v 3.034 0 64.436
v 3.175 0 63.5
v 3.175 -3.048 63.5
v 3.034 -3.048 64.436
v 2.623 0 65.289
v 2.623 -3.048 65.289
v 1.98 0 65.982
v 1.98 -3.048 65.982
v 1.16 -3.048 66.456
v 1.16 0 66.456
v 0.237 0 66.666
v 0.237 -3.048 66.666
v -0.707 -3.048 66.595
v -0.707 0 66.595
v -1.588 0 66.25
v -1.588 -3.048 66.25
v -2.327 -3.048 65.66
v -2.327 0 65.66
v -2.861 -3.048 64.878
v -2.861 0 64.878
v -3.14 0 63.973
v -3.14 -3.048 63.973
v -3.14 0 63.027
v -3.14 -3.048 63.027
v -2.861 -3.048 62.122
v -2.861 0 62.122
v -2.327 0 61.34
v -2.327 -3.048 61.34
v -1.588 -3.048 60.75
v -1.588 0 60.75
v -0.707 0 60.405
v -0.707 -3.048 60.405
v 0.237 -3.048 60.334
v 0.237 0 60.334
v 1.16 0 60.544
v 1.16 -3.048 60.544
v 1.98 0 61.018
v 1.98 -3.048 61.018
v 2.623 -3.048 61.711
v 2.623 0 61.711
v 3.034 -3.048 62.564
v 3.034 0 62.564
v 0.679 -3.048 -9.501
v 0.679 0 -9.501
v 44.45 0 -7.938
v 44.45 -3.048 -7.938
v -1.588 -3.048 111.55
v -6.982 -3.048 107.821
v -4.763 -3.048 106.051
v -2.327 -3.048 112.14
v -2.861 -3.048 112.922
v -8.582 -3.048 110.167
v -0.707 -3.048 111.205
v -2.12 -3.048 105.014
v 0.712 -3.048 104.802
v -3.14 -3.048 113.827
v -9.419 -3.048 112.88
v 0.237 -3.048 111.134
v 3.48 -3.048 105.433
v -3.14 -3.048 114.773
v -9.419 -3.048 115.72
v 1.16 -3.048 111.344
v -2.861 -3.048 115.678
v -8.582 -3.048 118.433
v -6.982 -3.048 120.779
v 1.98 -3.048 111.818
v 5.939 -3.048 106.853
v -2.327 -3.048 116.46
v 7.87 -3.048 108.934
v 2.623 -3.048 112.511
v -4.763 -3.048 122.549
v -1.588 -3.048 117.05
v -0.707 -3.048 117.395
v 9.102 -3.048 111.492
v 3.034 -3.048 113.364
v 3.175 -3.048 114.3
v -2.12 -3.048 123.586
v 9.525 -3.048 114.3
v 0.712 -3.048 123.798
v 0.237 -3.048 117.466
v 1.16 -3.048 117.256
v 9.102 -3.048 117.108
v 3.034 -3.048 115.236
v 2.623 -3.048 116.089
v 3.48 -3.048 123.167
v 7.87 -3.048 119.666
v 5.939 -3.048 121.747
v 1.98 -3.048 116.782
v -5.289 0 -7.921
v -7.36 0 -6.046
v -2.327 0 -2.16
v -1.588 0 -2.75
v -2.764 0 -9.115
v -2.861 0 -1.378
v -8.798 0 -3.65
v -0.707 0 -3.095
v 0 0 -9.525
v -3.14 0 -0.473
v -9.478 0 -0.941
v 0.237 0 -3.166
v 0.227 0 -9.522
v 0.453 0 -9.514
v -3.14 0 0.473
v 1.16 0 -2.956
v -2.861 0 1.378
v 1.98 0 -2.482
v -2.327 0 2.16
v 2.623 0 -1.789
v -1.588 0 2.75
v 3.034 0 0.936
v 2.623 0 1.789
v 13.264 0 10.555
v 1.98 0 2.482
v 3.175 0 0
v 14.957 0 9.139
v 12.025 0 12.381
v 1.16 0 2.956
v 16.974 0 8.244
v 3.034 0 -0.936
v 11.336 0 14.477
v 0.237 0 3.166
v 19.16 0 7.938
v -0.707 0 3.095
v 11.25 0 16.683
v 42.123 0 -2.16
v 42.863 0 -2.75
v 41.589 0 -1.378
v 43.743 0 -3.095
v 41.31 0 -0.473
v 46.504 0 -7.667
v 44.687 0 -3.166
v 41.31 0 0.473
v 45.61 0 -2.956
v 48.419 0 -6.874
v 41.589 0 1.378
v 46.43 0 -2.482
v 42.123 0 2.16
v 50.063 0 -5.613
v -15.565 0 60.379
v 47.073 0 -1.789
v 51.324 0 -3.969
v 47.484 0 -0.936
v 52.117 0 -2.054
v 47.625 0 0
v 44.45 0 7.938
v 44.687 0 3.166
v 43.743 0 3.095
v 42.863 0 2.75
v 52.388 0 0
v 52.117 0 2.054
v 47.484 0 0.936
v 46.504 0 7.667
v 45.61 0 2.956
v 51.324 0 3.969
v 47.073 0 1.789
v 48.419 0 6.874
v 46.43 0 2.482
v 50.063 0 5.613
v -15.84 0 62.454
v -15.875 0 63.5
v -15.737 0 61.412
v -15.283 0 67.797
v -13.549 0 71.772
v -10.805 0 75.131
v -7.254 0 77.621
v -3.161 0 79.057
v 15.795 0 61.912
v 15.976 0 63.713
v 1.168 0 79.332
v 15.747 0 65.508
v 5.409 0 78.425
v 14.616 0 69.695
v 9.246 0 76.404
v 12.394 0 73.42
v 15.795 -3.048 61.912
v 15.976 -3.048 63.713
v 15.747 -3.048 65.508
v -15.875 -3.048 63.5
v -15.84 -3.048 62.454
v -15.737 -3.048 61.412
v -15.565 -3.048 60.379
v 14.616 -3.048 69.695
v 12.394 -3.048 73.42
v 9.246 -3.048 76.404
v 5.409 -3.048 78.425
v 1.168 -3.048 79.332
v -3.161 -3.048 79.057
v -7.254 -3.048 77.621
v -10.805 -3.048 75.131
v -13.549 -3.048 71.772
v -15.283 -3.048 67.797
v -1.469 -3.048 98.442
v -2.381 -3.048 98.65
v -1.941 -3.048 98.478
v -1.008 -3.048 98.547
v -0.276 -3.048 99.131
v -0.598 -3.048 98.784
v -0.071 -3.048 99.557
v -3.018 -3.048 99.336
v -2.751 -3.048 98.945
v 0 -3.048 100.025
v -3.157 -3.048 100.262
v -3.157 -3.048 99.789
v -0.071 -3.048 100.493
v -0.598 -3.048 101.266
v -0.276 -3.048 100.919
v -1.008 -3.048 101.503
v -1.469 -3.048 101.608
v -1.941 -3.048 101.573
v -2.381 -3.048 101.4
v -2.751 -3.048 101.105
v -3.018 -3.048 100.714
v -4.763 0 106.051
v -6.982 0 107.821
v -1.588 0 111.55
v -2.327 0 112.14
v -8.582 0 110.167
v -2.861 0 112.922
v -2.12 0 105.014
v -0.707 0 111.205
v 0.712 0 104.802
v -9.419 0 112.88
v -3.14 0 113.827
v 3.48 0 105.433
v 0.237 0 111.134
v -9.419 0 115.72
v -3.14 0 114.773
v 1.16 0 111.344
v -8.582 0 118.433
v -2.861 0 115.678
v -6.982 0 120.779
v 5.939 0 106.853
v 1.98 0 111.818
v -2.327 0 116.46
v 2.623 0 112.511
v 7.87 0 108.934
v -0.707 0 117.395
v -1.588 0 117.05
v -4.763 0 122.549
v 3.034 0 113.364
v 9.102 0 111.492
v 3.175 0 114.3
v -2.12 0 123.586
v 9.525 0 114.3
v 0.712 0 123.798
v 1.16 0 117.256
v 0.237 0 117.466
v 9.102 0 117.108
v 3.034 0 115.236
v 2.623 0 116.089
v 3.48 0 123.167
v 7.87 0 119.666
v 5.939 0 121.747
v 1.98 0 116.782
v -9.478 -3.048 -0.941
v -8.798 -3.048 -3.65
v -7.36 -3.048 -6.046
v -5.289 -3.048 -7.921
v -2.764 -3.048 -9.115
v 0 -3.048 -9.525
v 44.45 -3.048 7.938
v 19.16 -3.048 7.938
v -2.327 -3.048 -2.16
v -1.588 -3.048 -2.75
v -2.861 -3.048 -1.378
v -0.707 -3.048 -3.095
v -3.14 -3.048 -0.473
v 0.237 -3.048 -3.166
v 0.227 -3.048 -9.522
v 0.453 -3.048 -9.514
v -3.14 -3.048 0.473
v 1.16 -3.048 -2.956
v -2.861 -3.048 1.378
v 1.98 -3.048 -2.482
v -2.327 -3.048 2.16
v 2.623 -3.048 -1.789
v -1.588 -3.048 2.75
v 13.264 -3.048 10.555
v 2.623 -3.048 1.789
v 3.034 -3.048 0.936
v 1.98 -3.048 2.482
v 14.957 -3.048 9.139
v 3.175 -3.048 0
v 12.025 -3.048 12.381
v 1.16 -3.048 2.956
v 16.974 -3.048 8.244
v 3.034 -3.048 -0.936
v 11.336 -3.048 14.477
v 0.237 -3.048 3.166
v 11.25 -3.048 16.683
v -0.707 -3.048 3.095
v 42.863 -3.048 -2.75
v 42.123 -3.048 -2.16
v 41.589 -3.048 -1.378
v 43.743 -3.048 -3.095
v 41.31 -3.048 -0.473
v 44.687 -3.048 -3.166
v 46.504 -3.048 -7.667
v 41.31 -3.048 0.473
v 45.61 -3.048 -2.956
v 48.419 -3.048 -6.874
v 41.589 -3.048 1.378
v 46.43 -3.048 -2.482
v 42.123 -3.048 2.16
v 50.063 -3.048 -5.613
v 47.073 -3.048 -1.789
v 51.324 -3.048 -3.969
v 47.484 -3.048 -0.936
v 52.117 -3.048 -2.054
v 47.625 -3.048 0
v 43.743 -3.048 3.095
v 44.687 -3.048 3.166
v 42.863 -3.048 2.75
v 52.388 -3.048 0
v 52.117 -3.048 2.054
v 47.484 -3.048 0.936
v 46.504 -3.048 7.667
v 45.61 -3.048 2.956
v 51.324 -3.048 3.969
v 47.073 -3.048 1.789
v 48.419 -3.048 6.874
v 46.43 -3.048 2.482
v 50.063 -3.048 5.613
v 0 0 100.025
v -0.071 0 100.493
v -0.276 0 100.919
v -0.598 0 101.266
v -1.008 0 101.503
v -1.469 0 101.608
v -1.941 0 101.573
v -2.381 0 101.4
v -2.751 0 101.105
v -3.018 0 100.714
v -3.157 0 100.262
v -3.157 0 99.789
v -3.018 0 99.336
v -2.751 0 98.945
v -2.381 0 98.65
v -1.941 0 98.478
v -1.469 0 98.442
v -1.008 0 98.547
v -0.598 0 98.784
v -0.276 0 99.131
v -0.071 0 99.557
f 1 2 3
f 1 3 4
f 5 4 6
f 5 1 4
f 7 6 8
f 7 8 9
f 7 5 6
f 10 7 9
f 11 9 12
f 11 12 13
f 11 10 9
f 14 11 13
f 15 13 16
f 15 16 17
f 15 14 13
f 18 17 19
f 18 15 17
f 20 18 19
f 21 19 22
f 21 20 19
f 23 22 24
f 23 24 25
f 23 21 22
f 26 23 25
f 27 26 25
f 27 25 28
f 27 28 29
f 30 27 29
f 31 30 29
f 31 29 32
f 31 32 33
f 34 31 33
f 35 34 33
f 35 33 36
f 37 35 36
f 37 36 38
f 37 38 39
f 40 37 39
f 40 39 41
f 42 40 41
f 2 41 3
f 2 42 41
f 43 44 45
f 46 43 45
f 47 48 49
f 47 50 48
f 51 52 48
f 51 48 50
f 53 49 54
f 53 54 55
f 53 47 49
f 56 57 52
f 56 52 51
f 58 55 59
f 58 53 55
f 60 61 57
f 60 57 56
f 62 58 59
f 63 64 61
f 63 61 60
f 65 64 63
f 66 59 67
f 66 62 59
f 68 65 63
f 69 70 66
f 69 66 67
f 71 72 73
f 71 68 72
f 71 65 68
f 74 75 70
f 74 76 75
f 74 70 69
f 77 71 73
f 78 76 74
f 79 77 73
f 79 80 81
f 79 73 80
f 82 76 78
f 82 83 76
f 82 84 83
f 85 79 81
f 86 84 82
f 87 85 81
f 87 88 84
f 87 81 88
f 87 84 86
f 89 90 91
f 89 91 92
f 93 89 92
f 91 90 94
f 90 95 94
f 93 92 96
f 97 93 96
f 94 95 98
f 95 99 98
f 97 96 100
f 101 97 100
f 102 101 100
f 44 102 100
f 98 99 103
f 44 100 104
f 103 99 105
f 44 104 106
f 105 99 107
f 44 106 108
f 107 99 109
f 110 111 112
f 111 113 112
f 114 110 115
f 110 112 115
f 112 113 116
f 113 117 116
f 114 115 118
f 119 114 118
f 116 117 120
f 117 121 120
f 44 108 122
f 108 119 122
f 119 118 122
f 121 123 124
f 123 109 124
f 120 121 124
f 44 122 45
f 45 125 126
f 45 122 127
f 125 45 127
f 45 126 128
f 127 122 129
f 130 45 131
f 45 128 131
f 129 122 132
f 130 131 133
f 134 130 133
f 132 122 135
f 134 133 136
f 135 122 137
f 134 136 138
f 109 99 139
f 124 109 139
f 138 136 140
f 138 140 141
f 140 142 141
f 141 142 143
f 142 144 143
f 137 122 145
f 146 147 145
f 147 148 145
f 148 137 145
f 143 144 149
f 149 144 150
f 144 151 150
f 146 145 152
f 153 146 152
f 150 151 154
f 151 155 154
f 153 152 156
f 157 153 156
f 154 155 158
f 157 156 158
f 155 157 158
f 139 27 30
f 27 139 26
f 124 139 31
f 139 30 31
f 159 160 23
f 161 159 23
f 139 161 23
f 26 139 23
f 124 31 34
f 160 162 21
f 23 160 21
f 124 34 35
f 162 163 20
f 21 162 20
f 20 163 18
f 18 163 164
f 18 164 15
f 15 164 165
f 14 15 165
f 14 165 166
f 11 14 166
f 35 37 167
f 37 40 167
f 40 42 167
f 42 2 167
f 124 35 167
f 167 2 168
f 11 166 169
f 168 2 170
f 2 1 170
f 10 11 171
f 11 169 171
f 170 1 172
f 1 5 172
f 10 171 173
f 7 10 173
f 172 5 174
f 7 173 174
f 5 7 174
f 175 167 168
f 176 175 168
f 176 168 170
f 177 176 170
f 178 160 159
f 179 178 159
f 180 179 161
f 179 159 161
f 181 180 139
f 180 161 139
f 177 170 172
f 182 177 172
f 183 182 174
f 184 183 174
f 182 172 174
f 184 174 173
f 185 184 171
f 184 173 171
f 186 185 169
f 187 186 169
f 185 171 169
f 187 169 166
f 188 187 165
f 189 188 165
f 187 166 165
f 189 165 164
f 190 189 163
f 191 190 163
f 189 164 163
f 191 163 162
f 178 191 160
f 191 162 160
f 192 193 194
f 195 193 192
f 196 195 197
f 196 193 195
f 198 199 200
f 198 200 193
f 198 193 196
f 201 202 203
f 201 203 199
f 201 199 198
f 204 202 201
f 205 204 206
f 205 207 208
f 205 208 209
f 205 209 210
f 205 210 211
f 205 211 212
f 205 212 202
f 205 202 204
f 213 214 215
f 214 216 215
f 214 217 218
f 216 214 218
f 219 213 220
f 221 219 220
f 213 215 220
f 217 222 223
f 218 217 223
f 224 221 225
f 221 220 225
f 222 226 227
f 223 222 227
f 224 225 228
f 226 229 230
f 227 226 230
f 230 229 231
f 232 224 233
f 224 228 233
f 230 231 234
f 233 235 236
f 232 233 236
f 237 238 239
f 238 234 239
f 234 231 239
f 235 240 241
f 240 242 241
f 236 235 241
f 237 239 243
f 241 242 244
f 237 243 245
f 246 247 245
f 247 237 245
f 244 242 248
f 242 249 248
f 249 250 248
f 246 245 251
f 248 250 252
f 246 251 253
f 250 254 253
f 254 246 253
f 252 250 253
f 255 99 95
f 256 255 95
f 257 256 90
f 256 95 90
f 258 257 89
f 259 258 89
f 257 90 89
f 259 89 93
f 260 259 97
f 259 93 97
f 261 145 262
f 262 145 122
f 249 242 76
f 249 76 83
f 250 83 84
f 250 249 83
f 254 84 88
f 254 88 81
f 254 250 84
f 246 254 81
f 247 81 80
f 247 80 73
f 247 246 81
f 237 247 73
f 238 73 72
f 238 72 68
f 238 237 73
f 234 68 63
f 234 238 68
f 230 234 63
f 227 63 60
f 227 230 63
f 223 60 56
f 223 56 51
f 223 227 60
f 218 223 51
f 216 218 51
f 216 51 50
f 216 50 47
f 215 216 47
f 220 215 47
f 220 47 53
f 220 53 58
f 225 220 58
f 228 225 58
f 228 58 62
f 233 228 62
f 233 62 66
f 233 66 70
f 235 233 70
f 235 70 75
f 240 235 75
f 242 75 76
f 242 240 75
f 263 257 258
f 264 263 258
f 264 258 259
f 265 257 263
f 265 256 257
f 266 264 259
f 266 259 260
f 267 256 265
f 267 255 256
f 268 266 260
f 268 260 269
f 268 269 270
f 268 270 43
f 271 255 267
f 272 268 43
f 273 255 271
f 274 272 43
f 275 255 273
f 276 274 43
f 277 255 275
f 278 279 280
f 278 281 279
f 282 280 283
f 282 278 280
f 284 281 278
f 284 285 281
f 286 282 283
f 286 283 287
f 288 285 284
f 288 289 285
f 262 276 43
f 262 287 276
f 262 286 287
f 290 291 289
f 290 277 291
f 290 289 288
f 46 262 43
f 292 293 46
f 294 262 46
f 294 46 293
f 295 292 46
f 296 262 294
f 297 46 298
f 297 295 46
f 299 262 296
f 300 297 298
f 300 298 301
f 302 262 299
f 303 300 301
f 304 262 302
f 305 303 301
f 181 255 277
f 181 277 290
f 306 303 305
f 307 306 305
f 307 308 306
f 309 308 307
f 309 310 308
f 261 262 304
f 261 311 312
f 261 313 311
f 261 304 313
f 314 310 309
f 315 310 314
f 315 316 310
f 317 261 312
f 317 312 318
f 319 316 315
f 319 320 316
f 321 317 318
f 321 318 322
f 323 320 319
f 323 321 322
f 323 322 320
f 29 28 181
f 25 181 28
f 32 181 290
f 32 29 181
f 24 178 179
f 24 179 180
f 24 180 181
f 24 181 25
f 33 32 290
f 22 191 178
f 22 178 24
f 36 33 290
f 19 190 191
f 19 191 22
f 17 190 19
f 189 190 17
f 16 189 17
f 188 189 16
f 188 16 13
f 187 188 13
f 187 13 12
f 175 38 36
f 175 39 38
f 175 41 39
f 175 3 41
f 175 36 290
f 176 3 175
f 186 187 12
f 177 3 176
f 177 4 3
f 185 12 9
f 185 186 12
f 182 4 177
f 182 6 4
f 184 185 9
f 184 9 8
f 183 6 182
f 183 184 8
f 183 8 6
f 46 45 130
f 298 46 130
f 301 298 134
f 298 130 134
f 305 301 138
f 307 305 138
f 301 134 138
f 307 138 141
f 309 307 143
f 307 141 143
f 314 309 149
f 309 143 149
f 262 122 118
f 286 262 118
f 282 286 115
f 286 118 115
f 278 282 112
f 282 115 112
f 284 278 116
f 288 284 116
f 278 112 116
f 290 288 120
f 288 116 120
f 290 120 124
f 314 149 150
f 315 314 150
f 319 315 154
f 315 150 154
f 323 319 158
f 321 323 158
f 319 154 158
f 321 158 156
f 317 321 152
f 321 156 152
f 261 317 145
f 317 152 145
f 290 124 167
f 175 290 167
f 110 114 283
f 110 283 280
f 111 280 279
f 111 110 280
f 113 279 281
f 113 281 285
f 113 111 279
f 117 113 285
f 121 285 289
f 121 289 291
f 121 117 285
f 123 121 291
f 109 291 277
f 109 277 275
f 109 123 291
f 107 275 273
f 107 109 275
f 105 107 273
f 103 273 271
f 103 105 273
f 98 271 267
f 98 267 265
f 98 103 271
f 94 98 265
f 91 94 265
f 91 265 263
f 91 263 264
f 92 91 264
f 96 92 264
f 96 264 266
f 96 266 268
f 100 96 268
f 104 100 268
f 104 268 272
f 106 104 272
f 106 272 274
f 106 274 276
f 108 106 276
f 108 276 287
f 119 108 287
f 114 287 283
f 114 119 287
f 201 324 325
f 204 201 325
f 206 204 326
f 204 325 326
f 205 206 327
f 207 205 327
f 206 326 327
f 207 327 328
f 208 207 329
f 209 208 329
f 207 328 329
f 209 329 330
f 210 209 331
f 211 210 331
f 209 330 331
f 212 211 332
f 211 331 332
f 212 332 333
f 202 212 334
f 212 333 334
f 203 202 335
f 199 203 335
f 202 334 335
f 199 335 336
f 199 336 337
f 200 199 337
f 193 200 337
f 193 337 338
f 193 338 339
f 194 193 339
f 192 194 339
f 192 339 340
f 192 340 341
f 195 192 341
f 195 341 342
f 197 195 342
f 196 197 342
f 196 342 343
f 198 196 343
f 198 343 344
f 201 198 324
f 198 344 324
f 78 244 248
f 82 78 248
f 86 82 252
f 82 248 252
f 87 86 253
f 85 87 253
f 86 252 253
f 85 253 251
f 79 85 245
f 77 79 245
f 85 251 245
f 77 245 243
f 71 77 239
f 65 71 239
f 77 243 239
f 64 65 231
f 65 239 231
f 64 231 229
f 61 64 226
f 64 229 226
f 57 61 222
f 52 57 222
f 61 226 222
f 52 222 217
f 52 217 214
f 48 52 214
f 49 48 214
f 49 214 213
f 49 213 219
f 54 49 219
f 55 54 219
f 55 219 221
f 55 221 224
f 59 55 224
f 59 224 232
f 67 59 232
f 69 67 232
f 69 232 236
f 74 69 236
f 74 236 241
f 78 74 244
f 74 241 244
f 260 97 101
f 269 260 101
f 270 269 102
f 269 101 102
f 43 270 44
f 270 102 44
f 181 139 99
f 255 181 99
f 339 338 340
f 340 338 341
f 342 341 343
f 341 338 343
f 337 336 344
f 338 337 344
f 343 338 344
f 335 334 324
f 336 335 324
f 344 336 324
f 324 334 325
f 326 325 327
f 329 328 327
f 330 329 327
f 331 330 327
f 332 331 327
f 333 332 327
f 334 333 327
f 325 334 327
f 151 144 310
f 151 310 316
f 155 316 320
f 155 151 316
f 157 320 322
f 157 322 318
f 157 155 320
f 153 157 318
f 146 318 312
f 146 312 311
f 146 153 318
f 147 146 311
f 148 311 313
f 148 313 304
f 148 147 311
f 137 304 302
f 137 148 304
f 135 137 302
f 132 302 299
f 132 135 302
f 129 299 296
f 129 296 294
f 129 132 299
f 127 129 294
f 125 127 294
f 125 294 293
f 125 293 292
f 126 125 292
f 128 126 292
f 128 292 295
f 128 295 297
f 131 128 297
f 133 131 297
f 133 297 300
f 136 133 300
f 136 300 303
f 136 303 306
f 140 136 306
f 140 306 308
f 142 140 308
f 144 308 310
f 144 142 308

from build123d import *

# Parameters (mm, degrees)
F0_R     = 3.175
F0_R_2   = 1.5875
F1_DEPTH = 3.048


with BuildPart() as f1:
    # F0 (on Front) → F1 (new body)
    with BuildSketch(Plane.XZ):
        with BuildLine():
            ThreePointArc((0.67949, -9.500732), (6.97129, -6.490511), (9.525, 0))
            ThreePointArc((9.525, 0), (-0.471004, 9.513348), (-9.478419, -0.940855))
            ThreePointArc((-9.478419, -0.940855), (-6.393903, -7.060002), (0, -9.525))
            Line((0, -9.525), (0.67949, -9.500732))
        make_face()
        Circle(F0_R, mode=Mode.SUBTRACT)
        with BuildLine():
            ThreePointArc((-9.478419, -0.940855), (-0.471004, 9.513348), (9.525, 0))
            ThreePointArc((9.525, 0), (6.97129, -6.490511), (0.67949, -9.500732))
            Line((0.67949, -9.500732), (44.45, -7.9375))
            ThreePointArc((44.45, -7.9375), (36.5125, 0), (44.45, 7.9375))
            Line((44.45, 7.9375), (19.160011, 7.9375))
            ThreePointArc((19.160011, 7.9375), (13.263985, 10.554544), (11.249662, 16.68272))
            Line((11.249662, 16.68272), (15.795426, 61.9125))
            ThreePointArc((15.795426, 61.9125), (0.775265, 47.643942), (-15.565216, 60.379155))
            Line((-15.565216, 60.379155), (-9.478419, -0.940855))
        make_face()
        with BuildLine():
            ThreePointArc((-9.525, 114.3), (0, 104.775), (9.525, 114.3))
            ThreePointArc((9.525, 114.3), (0, 123.825), (-9.525, 114.3))
        make_face()
        with Locations((0, 114.3)):
            Circle(F0_R, mode=Mode.SUBTRACT)
        with BuildLine():
            ThreePointArc((0, -9.525), (0.339962, -9.518931), (0.67949, -9.500732))
            Line((0.67949, -9.500732), (0, -9.525))
        make_face()
        with BuildLine():
            Line((-15.875, 63.5), (-15.565216, 60.379155))
            ThreePointArc((-15.565216, 60.379155), (0.775265, 47.643942), (15.795426, 61.9125))
            ThreePointArc((15.795426, 61.9125), (15.855094, 62.705253), (15.875, 63.5))
            ThreePointArc((15.875, 63.5), (15.843082, 64.506168), (15.747457, 65.508289))
            ThreePointArc((15.747457, 65.508289), (-1.006168, 79.343082), (-15.875, 63.5))
        make_face()
        with Locations((0, 63.5)):
            Circle(F0_R, mode=Mode.SUBTRACT)
        with BuildLine():
            ThreePointArc((-15.875, 63.5), (-15.797364, 61.931909), (-15.565216, 60.379155))
            Line((-15.565216, 60.379155), (-15.875, 63.5))
        make_face()
        with BuildLine():
            ThreePointArc((44.45, 7.9375), (36.5125, 0), (44.45, -7.9375))
            ThreePointArc((44.45, -7.9375), (50.06266, -5.61266), (52.3875, 0))
            ThreePointArc((52.3875, 0), (50.06266, 5.61266), (44.45, 7.9375))
        make_face()
        with Locations((44.45, 0)):
            Circle(F0_R, mode=Mode.SUBTRACT)
        with BuildLine():
            ThreePointArc((15.875, 63.5), (15.855094, 62.705253), (15.795426, 61.9125))
            Line((15.795426, 61.9125), (15.976396, 63.713129))
            Line((15.976396, 63.713129), (15.747457, 65.508289))
            ThreePointArc((15.747457, 65.508289), (15.843082, 64.506168), (15.875, 63.5))
        make_face()
        with Locations((-1.5875, 100.0252)):
            Circle(F0_R_2)
    extrude(amount=F1_DEPTH)


solid = f1.part
